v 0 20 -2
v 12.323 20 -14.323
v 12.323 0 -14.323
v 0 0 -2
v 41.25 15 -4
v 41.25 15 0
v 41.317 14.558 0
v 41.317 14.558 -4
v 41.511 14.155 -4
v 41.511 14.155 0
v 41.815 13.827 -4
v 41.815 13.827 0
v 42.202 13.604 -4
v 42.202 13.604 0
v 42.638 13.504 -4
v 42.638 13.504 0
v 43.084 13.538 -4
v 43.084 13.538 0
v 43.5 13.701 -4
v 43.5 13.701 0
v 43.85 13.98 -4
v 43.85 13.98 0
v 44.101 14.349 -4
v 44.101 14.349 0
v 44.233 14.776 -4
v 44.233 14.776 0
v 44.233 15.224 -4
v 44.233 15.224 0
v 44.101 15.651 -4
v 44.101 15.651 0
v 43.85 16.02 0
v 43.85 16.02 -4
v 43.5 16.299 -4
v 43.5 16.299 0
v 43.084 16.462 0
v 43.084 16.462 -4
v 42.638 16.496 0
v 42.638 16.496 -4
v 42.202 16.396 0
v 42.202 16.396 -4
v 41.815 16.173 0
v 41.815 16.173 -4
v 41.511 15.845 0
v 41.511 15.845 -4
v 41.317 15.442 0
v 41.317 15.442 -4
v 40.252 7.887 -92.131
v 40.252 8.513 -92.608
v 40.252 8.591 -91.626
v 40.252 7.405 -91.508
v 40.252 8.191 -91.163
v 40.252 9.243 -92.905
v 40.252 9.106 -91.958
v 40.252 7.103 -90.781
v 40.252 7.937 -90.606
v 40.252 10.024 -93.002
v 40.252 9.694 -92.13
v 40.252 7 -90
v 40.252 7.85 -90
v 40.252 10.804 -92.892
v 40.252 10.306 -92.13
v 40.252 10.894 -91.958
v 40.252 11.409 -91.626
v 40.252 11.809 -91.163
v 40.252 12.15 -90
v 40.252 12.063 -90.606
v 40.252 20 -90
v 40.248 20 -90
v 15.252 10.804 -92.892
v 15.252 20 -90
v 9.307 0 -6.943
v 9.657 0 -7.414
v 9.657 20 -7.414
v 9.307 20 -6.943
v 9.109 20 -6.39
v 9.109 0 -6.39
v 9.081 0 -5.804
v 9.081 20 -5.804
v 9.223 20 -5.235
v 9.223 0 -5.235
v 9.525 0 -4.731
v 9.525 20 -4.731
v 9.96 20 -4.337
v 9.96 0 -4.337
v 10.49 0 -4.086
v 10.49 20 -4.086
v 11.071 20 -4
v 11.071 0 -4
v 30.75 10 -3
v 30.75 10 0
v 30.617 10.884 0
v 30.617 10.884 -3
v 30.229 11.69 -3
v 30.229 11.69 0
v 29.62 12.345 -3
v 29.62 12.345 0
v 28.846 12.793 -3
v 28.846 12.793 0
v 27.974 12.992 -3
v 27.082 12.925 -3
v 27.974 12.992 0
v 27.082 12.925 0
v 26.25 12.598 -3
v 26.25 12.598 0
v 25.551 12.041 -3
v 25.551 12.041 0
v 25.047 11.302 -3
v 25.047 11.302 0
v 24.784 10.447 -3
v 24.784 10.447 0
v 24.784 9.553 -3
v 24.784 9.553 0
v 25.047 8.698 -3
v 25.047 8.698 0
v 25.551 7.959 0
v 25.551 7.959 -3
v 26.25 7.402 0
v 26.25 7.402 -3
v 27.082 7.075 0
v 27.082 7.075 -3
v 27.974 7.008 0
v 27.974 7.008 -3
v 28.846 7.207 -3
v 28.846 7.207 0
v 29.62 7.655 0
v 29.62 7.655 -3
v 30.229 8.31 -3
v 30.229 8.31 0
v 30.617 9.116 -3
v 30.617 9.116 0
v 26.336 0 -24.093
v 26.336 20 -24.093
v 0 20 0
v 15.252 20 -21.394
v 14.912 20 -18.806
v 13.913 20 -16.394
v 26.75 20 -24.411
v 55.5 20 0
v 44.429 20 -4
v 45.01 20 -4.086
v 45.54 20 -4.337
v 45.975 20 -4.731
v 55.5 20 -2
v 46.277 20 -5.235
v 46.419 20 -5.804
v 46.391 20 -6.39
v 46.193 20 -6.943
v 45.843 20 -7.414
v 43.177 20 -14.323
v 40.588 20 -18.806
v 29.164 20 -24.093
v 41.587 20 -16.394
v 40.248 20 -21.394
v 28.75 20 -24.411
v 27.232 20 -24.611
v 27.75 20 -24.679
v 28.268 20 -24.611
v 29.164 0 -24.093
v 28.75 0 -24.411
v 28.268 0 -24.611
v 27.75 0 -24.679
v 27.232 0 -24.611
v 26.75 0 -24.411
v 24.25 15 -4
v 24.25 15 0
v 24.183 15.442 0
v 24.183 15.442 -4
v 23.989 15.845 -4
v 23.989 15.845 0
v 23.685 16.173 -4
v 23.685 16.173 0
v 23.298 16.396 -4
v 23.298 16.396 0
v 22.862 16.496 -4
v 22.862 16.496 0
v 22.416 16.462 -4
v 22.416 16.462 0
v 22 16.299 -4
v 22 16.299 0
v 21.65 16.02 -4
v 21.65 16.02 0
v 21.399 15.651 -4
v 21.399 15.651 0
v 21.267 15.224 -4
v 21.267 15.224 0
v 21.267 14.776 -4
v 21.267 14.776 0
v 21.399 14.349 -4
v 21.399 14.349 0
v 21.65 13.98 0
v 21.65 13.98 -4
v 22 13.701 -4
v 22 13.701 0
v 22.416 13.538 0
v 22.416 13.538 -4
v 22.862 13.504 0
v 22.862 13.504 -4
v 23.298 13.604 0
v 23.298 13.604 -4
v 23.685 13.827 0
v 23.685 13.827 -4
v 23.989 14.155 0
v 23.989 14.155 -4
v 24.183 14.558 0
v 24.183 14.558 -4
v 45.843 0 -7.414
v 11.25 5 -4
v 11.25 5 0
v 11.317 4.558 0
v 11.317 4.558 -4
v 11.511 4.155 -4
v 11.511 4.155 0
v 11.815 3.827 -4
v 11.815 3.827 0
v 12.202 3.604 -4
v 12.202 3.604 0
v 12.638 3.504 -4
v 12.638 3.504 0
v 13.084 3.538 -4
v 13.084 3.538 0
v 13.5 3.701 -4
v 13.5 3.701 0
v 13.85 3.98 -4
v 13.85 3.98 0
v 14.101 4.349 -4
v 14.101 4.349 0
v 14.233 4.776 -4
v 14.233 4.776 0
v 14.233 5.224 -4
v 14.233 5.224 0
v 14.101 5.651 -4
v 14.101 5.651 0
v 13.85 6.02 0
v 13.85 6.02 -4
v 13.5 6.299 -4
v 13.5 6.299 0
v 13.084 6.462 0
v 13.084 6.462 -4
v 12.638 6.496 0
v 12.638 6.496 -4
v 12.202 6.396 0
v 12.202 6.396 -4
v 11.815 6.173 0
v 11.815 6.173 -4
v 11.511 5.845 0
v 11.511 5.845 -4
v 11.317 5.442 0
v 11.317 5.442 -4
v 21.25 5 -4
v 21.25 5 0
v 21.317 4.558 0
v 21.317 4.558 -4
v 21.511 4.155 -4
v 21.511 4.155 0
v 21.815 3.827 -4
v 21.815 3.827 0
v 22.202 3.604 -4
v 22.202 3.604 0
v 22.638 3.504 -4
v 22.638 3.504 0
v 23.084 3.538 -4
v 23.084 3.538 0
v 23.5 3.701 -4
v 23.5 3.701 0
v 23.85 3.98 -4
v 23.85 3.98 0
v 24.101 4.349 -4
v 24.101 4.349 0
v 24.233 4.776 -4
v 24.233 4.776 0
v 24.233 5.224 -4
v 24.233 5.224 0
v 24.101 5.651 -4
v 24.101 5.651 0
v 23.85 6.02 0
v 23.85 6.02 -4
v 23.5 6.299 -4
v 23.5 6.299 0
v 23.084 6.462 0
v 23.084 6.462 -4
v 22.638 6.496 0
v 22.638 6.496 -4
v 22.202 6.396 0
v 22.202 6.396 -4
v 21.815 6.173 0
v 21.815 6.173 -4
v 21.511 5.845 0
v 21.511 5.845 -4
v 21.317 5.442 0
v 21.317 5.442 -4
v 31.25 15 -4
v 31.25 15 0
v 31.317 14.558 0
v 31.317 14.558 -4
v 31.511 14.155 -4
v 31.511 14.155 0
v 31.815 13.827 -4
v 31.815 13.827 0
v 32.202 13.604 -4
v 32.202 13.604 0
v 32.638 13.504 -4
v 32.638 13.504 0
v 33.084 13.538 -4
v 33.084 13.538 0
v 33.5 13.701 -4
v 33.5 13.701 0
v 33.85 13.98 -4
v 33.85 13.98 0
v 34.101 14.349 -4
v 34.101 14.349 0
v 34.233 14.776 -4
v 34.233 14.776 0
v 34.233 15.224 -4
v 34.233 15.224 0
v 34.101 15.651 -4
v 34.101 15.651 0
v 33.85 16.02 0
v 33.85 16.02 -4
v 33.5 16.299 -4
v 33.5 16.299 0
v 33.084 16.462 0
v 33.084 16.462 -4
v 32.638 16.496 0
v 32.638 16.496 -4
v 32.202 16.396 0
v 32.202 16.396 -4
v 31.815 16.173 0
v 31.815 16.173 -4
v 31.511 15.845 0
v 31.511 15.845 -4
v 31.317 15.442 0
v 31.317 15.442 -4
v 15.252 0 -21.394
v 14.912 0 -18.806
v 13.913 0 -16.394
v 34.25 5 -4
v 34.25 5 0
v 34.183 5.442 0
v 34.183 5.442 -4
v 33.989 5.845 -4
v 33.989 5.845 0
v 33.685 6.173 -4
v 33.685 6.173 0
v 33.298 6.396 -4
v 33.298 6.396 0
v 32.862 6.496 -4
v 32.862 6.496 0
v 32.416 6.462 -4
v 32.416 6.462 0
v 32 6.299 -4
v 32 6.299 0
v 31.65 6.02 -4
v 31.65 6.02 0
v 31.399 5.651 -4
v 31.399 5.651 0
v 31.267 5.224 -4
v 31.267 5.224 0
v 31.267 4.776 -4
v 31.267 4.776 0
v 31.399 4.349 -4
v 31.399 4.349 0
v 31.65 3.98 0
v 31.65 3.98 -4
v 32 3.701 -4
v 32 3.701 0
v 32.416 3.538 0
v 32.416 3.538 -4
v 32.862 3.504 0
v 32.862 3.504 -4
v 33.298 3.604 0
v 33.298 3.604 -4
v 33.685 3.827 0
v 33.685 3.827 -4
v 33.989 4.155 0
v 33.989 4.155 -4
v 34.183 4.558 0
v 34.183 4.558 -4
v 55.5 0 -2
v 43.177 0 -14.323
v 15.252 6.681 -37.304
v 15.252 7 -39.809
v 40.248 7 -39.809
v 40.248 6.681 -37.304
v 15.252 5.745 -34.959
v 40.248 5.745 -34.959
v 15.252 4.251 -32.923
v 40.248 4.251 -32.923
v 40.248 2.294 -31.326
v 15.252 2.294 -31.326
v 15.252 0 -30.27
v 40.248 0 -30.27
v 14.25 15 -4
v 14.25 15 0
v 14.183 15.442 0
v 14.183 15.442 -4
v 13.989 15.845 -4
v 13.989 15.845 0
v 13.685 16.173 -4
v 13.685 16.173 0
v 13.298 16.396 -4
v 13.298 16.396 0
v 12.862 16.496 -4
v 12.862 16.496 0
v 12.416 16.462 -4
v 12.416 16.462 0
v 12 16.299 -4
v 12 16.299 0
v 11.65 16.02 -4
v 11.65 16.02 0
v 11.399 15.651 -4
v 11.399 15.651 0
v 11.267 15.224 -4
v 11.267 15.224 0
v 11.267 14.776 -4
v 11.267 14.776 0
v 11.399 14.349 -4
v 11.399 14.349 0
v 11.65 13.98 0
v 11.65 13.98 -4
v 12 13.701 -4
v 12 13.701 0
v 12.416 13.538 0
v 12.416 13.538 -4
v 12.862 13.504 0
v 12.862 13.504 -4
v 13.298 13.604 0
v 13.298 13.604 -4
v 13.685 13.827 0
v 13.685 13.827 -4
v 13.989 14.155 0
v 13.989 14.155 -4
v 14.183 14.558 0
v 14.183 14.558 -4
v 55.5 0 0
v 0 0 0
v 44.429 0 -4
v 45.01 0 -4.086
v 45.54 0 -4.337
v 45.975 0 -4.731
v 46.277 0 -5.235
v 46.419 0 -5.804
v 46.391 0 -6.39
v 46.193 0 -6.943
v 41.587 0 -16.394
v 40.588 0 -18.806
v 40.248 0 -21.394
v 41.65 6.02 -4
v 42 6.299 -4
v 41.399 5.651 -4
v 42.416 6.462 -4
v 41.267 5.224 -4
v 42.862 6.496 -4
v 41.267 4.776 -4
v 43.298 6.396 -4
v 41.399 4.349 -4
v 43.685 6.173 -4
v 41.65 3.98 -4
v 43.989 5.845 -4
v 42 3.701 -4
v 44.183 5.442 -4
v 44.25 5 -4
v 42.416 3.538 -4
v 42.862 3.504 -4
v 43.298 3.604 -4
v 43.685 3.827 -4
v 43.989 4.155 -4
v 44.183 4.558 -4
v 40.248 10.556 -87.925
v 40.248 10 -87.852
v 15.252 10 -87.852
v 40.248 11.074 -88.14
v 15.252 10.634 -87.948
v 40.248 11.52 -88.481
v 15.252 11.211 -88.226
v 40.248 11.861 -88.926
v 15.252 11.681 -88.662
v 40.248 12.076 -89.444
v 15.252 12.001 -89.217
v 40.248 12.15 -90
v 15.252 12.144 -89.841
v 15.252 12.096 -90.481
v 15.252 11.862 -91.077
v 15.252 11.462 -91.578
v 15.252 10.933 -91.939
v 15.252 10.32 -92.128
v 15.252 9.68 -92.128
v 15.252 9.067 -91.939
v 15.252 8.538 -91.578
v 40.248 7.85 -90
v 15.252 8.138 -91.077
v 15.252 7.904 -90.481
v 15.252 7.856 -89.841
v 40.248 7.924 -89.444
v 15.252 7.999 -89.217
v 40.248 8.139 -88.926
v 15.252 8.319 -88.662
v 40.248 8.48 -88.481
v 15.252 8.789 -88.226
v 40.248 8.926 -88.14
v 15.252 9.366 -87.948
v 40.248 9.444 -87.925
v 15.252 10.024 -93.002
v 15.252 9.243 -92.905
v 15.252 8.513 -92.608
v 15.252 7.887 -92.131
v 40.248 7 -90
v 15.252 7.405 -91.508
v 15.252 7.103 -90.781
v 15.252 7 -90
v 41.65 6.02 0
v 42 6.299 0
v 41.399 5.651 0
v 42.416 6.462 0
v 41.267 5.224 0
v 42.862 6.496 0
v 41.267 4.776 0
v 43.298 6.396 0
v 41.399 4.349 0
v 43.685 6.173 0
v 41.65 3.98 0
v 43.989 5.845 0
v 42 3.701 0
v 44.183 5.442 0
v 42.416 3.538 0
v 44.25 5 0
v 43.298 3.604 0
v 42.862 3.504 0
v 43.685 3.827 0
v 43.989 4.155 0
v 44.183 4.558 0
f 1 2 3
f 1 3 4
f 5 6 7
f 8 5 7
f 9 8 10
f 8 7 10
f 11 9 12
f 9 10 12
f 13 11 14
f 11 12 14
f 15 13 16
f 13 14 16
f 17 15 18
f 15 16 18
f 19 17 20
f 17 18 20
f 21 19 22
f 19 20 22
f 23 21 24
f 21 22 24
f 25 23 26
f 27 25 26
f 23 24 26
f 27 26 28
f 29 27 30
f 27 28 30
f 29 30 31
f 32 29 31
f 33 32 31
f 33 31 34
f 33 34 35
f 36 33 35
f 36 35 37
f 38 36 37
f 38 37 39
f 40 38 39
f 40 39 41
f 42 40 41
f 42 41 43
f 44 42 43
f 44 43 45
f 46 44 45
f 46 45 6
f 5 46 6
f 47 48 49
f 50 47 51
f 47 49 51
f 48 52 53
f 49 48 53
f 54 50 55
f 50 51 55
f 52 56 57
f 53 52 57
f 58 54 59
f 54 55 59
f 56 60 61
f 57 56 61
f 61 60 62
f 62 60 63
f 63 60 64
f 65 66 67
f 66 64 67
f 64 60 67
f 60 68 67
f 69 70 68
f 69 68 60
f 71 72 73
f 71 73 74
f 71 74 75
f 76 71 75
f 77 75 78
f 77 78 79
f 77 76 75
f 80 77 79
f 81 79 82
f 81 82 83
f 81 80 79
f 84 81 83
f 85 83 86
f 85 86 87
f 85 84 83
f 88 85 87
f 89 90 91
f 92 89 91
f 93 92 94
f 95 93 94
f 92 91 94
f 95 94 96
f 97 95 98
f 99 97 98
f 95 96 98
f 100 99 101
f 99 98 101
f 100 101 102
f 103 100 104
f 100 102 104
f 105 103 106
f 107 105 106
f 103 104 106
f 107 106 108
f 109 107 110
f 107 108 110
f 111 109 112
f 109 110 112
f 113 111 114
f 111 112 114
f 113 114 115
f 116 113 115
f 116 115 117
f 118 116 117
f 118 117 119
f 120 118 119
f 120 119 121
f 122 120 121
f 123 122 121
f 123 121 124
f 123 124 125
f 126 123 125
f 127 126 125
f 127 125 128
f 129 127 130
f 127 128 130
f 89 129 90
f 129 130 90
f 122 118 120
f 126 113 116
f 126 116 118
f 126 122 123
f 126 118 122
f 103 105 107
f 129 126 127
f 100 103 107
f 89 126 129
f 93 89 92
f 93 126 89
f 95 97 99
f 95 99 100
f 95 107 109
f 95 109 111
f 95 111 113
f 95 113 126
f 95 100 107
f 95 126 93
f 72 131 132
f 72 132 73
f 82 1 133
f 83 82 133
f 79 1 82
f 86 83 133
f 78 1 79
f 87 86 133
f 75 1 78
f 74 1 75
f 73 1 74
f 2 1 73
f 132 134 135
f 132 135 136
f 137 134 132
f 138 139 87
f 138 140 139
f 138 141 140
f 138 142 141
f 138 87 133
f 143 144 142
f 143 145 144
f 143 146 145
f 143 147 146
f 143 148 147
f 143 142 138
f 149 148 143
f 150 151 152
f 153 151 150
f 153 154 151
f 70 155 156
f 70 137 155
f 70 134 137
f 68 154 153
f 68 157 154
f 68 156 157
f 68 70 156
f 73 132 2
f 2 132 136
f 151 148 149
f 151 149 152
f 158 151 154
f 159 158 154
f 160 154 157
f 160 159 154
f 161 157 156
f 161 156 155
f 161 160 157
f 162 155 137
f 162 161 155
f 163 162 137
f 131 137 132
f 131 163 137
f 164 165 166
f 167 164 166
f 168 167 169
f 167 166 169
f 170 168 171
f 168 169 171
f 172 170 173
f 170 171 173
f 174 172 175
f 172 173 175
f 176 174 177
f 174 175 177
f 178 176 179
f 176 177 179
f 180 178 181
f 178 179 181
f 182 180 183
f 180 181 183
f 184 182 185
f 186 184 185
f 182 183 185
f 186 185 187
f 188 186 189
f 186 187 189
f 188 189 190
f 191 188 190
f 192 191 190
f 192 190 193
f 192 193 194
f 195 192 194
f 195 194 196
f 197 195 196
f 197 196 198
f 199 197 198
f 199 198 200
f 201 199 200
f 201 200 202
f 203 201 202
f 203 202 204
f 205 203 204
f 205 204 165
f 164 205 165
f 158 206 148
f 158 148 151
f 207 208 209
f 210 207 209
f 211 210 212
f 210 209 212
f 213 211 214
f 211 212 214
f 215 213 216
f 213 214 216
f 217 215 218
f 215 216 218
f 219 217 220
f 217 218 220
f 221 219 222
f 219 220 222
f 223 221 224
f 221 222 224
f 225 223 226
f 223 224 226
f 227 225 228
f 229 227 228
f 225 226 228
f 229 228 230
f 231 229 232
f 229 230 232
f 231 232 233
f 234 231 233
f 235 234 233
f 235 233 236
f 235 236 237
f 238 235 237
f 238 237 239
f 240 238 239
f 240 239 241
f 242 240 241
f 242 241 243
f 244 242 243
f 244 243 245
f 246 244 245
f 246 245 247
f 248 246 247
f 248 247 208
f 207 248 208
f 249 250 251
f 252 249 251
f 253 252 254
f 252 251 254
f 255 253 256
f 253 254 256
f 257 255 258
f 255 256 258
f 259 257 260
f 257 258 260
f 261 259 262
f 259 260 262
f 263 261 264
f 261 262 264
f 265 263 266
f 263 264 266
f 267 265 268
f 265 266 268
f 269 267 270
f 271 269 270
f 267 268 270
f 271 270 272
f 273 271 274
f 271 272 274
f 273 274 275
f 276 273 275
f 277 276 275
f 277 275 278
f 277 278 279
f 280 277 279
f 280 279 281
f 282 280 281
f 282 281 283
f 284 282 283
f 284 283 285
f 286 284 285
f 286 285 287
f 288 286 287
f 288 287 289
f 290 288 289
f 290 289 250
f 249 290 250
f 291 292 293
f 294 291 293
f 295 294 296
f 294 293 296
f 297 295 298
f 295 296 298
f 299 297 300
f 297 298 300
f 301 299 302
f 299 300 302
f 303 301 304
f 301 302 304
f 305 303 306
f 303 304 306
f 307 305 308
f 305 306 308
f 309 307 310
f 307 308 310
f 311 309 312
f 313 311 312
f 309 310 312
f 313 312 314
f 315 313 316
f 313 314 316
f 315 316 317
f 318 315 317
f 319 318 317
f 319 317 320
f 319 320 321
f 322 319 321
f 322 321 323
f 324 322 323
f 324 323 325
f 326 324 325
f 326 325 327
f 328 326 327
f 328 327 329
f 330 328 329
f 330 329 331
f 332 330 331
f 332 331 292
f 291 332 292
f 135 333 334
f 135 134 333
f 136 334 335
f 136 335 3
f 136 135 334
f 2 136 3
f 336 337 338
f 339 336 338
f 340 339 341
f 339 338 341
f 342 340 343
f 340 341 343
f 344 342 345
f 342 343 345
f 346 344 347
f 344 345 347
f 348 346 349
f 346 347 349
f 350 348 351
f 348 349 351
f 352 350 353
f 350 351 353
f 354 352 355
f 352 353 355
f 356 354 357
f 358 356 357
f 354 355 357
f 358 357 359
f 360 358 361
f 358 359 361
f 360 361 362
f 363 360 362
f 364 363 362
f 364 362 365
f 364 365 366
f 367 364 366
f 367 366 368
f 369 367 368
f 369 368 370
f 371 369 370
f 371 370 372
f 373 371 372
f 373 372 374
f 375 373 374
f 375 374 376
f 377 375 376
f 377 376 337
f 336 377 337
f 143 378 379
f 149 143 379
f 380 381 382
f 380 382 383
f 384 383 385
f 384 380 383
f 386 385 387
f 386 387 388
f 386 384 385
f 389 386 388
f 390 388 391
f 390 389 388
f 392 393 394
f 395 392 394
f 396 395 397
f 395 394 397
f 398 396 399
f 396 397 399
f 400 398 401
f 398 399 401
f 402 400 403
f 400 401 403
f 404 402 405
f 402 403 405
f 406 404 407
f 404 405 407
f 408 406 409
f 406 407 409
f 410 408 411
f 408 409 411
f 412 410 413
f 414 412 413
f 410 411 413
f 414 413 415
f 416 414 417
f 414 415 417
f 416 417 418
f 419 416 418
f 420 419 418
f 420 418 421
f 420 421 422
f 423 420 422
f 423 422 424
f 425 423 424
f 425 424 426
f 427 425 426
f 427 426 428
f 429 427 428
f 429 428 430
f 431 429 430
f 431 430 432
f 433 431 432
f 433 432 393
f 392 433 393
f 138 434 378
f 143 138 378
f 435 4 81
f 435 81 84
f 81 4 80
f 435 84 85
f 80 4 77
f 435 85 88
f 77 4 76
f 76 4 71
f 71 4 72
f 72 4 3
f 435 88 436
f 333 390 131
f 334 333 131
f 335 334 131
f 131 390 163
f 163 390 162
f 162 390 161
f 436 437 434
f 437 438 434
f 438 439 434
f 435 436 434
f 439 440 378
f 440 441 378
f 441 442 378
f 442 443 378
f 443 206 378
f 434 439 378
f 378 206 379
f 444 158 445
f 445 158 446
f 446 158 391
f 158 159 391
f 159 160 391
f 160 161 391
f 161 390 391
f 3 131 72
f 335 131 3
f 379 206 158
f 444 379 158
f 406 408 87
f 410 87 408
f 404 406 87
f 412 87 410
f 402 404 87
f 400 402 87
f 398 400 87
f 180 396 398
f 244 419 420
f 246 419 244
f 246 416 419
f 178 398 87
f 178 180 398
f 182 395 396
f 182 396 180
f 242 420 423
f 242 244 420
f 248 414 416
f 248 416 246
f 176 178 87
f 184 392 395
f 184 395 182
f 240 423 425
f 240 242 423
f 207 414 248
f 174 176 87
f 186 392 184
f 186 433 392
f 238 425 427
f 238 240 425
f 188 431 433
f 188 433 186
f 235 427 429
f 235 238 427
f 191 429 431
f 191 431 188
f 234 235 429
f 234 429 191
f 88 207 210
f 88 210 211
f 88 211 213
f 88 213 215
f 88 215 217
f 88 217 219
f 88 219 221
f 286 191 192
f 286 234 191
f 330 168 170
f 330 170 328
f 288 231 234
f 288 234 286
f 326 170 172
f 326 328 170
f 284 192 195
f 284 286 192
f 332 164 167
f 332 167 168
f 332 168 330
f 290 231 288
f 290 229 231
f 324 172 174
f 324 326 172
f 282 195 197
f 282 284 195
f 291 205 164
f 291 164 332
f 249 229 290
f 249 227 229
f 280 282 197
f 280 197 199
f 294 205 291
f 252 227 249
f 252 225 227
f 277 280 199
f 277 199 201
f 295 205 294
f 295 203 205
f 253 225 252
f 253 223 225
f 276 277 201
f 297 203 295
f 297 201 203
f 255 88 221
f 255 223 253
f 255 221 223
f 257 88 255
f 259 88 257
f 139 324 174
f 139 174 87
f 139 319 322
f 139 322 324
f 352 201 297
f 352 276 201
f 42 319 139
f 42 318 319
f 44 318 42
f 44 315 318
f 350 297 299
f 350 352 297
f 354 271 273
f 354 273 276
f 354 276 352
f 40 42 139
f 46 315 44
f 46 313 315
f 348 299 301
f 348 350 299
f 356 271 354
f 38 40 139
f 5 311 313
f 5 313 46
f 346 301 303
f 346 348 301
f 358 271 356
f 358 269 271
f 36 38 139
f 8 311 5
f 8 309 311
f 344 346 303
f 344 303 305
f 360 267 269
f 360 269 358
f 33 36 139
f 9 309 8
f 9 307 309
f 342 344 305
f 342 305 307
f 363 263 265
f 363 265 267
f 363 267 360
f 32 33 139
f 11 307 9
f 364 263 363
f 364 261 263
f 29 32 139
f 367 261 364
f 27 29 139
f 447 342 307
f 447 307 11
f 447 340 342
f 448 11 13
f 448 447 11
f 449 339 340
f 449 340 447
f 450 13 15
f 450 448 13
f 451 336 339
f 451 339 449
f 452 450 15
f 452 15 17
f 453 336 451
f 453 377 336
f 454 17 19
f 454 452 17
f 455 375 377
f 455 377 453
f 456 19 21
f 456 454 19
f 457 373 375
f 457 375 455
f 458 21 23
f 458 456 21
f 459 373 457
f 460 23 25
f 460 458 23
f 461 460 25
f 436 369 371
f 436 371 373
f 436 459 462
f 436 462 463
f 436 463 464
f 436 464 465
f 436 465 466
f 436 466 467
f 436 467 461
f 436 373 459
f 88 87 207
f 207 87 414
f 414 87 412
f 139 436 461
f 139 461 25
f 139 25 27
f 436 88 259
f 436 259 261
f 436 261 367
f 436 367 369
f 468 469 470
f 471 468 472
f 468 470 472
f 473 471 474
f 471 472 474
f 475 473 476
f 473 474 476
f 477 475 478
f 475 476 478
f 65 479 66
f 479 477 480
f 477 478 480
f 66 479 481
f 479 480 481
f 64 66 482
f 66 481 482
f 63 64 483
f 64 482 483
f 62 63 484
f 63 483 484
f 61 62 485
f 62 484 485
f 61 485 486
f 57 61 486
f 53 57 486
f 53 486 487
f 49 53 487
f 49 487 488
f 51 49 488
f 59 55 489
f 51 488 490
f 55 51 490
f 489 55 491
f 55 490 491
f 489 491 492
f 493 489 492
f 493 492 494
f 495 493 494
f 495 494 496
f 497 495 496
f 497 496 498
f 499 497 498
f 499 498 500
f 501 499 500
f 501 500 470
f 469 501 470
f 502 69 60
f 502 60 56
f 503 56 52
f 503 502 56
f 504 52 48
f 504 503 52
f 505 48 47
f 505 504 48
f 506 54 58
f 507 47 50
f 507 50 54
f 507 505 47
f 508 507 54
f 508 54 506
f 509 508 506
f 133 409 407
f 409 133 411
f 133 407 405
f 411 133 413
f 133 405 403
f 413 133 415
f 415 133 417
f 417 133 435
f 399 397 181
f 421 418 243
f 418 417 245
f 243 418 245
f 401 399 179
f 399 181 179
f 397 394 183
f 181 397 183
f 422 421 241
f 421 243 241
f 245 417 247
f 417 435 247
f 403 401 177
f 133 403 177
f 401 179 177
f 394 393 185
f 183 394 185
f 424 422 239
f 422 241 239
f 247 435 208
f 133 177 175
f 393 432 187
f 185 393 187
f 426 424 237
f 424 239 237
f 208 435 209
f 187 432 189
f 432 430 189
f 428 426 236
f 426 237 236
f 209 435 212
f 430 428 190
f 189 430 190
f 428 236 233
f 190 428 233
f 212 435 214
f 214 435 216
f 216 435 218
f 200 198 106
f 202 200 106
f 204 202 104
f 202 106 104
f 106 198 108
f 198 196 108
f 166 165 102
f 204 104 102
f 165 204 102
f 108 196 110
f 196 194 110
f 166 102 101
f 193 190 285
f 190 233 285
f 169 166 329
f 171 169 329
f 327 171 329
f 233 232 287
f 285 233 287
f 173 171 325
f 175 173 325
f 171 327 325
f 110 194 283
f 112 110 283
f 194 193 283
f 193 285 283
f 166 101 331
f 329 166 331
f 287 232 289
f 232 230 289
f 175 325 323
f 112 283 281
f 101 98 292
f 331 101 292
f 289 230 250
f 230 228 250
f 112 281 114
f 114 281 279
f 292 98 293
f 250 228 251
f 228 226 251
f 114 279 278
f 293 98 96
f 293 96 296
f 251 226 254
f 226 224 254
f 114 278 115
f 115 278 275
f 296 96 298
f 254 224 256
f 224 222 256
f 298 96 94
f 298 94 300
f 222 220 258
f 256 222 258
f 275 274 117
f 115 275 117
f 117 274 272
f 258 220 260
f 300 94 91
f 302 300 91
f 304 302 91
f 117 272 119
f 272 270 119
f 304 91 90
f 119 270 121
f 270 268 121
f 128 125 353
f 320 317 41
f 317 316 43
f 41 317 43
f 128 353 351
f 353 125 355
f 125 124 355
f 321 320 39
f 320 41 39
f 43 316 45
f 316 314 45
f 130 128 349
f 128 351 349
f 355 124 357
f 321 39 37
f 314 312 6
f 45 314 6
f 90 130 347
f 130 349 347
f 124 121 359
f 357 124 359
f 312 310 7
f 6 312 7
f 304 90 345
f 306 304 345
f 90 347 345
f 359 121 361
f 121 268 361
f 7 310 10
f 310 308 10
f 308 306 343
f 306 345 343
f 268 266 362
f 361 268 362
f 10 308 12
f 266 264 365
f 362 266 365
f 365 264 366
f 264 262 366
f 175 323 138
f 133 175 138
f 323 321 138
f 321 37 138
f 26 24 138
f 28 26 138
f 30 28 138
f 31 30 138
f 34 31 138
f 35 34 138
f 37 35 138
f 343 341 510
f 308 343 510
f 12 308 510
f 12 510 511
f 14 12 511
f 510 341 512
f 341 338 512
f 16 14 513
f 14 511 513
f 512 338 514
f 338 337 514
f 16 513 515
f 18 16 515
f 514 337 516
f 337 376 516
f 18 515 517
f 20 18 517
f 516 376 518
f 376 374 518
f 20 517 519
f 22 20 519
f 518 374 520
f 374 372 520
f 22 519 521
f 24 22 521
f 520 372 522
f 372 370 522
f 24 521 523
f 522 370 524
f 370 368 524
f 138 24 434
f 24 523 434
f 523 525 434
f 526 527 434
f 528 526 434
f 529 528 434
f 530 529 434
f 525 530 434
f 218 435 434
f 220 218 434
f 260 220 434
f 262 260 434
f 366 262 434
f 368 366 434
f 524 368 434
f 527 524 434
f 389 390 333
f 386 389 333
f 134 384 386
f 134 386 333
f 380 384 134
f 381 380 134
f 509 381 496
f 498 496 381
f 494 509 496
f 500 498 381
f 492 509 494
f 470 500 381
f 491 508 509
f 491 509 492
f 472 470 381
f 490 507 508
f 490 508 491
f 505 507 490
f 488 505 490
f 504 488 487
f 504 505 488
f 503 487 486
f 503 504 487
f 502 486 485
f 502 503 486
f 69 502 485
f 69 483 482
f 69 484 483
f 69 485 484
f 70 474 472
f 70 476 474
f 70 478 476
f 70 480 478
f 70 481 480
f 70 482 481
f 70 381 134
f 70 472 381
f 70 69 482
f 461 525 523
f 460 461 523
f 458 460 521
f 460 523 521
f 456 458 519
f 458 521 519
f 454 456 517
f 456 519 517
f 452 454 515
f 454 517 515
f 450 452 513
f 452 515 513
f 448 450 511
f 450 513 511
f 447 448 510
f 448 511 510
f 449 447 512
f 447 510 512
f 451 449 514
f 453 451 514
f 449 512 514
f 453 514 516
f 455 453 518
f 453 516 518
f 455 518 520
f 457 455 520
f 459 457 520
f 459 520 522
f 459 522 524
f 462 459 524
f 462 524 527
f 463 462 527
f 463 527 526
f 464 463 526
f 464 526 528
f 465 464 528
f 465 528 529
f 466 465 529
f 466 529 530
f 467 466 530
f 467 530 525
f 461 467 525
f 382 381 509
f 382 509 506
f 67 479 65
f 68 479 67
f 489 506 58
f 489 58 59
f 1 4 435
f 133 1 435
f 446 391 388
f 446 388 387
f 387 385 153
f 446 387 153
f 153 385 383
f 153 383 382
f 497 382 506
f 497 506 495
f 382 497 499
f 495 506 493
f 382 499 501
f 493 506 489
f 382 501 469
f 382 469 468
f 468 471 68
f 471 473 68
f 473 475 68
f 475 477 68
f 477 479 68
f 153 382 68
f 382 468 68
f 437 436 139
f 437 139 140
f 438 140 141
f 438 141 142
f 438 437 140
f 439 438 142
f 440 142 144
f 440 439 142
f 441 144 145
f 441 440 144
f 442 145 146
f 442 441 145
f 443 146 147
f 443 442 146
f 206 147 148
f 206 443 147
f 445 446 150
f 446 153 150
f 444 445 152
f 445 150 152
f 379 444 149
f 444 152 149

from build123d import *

# Parameters (mm, degrees)
EXTRUDE_1_DEPTH     = 20
SKETCH_2_R          = 1.5
CUT_EXTRUDE_1_DEPTH = 5
SKETCH_3_R          = 3
CUT_EXTRUDE_2_DEPTH = 3
SKETCH_4_W          = 24.99770673
SKETCH_4_H          = 59.73
CUT_EXTRUDE_3_DEPTH = 7
EXTRUDE_2_DEPTH     = 25
SKETCH_6_R          = 2.15
CUT_EXTRUDE_4_DEPTH = 104.292213424
FILLET_4_R          = 10
FILLET_5_R          = 10


with BuildPart() as part:
    # 스케치1 → 보스-돌출1 (new body)
    with BuildSketch(Plane(origin=(0, 0, 0), x_dir=(1, 0, 0), z_dir=(0, 1, 0))):
        Polygon((40.24770673, 90), (15.25229327, 90), (15.25229327, 17.25229327), (0, 2), (0, 0), (55.5, 0), (55.5, 2), (40.24770673, 17.25229327), align=None)
        with BuildLine():
            Line((11.071067812, 4), (44.428932188, 4))
            ThreePointArc((44.428932188, 4), (46.276691253, 5.234633135), (45.843145751, 7.414213562))
            Line((45.843145751, 7.414213562), (29.164213562, 24.093145751))
            ThreePointArc((29.164213562, 24.093145751), (27.75, 24.678932188), (26.335786438, 24.093145751))
            Line((26.335786438, 24.093145751), (9.656854249, 7.414213562))
            ThreePointArc((9.656854249, 7.414213562), (9.223308747, 5.234633135), (11.071067812, 4))
        make_face(mode=Mode.SUBTRACT)
    extrude(amount=EXTRUDE_1_DEPTH)

    # 스케치2 → 컷-돌출1 (cut)
    with BuildSketch(Plane.XY):
        with Locations((12.75, 15)):
            Circle(SKETCH_2_R)
        with Locations((22.75, 15)):
            Circle(SKETCH_2_R)
        with Locations(Location((32.75, 15, 0), (0, 0, 180))):
            Circle(SKETCH_2_R)
        with Locations(Location((42.75, 15, 0), (0, 0, 180))):
            Circle(SKETCH_2_R)
        with Locations((42.75, 5)):
            Circle(SKETCH_2_R)
        with Locations((32.75, 5)):
            Circle(SKETCH_2_R)
        with Locations(Location((22.75, 5, 0), (0, 0, 180))):
            Circle(SKETCH_2_R)
        with Locations(Location((12.75, 5, 0), (0, 0, 180))):
            Circle(SKETCH_2_R)
    extrude(amount=-CUT_EXTRUDE_1_DEPTH, mode=Mode.SUBTRACT)

    # 스케치3 → 컷-돌출2 (cut)
    with BuildSketch(Plane.XY):
        with Locations((27.75, 10)):
            Circle(SKETCH_3_R)
    extrude(amount=-CUT_EXTRUDE_2_DEPTH, mode=Mode.SUBTRACT)

    # 스케치4 → 컷-돌출3 (cut)
    with BuildSketch(Plane.XZ):
        with Locations((27.748853365, -60.135)):
            Rectangle(SKETCH_4_W, SKETCH_4_H)
    extrude(amount=-CUT_EXTRUDE_3_DEPTH, mode=Mode.SUBTRACT)

    # 스케치5 → 보스-돌출2 (add)
    with BuildSketch(Plane.ZY.offset(-15.25229327)):
        with BuildLine():
            Line((-90, 20), (-92.892384696, 10.804147089))
            ThreePointArc((-92.892384696, 10.804147089), (-92.390282771, 8.184258847), (-90, 7))
            Line((-90, 7), (-90, 20))
        make_face()
    extrude(amount=-EXTRUDE_2_DEPTH)

    # 스케치6 → 컷-돌출4 (cut, through all)
    with BuildSketch(Plane.ZY.offset(-15.25229327)):
        with Locations((-90.002169099, 9.999999216)):
            Circle(SKETCH_6_R)
    extrude(amount=-CUT_EXTRUDE_4_DEPTH, mode=Mode.SUBTRACT)

    # 필렛4
    fillet_4_edges = [part.edges().sort_by_distance(p)[0] for p in [
        (15.25229327, 10, -17.25229327),
        (40.24770673, 10, -17.25229327),
    ]]
    fillet(fillet_4_edges, radius=FILLET_4_R)

    # 필렛5
    # the kernel refuses this fillet: 10 mm, written as the material it adds along each edge
    with BuildSketch(Plane(origin=(15.25229327, 7, -30.27), x_dir=(0, -1, 0), z_dir=(1, 0, 0))) as fillet_5_piece_1:
        with BuildLine():
            CenterArc((10, 9.539392014), FILLET_5_R, 180, 72.542396876)
            Line((0, 9.539392014), (-0.2, 9.539392014))
            Line((-0.2, 9.539392014), (-0.2, 0))
            Line((-0.2, 0), (0, -0.2))
            ThreePointArc((0, -0.2), (3.5, -0.2), (6.94, -0.19078784))
            Line((6.94, -0.19078784), (7, 0))
        make_face()
    extrude(amount=24.99541346)


solid = part.part
